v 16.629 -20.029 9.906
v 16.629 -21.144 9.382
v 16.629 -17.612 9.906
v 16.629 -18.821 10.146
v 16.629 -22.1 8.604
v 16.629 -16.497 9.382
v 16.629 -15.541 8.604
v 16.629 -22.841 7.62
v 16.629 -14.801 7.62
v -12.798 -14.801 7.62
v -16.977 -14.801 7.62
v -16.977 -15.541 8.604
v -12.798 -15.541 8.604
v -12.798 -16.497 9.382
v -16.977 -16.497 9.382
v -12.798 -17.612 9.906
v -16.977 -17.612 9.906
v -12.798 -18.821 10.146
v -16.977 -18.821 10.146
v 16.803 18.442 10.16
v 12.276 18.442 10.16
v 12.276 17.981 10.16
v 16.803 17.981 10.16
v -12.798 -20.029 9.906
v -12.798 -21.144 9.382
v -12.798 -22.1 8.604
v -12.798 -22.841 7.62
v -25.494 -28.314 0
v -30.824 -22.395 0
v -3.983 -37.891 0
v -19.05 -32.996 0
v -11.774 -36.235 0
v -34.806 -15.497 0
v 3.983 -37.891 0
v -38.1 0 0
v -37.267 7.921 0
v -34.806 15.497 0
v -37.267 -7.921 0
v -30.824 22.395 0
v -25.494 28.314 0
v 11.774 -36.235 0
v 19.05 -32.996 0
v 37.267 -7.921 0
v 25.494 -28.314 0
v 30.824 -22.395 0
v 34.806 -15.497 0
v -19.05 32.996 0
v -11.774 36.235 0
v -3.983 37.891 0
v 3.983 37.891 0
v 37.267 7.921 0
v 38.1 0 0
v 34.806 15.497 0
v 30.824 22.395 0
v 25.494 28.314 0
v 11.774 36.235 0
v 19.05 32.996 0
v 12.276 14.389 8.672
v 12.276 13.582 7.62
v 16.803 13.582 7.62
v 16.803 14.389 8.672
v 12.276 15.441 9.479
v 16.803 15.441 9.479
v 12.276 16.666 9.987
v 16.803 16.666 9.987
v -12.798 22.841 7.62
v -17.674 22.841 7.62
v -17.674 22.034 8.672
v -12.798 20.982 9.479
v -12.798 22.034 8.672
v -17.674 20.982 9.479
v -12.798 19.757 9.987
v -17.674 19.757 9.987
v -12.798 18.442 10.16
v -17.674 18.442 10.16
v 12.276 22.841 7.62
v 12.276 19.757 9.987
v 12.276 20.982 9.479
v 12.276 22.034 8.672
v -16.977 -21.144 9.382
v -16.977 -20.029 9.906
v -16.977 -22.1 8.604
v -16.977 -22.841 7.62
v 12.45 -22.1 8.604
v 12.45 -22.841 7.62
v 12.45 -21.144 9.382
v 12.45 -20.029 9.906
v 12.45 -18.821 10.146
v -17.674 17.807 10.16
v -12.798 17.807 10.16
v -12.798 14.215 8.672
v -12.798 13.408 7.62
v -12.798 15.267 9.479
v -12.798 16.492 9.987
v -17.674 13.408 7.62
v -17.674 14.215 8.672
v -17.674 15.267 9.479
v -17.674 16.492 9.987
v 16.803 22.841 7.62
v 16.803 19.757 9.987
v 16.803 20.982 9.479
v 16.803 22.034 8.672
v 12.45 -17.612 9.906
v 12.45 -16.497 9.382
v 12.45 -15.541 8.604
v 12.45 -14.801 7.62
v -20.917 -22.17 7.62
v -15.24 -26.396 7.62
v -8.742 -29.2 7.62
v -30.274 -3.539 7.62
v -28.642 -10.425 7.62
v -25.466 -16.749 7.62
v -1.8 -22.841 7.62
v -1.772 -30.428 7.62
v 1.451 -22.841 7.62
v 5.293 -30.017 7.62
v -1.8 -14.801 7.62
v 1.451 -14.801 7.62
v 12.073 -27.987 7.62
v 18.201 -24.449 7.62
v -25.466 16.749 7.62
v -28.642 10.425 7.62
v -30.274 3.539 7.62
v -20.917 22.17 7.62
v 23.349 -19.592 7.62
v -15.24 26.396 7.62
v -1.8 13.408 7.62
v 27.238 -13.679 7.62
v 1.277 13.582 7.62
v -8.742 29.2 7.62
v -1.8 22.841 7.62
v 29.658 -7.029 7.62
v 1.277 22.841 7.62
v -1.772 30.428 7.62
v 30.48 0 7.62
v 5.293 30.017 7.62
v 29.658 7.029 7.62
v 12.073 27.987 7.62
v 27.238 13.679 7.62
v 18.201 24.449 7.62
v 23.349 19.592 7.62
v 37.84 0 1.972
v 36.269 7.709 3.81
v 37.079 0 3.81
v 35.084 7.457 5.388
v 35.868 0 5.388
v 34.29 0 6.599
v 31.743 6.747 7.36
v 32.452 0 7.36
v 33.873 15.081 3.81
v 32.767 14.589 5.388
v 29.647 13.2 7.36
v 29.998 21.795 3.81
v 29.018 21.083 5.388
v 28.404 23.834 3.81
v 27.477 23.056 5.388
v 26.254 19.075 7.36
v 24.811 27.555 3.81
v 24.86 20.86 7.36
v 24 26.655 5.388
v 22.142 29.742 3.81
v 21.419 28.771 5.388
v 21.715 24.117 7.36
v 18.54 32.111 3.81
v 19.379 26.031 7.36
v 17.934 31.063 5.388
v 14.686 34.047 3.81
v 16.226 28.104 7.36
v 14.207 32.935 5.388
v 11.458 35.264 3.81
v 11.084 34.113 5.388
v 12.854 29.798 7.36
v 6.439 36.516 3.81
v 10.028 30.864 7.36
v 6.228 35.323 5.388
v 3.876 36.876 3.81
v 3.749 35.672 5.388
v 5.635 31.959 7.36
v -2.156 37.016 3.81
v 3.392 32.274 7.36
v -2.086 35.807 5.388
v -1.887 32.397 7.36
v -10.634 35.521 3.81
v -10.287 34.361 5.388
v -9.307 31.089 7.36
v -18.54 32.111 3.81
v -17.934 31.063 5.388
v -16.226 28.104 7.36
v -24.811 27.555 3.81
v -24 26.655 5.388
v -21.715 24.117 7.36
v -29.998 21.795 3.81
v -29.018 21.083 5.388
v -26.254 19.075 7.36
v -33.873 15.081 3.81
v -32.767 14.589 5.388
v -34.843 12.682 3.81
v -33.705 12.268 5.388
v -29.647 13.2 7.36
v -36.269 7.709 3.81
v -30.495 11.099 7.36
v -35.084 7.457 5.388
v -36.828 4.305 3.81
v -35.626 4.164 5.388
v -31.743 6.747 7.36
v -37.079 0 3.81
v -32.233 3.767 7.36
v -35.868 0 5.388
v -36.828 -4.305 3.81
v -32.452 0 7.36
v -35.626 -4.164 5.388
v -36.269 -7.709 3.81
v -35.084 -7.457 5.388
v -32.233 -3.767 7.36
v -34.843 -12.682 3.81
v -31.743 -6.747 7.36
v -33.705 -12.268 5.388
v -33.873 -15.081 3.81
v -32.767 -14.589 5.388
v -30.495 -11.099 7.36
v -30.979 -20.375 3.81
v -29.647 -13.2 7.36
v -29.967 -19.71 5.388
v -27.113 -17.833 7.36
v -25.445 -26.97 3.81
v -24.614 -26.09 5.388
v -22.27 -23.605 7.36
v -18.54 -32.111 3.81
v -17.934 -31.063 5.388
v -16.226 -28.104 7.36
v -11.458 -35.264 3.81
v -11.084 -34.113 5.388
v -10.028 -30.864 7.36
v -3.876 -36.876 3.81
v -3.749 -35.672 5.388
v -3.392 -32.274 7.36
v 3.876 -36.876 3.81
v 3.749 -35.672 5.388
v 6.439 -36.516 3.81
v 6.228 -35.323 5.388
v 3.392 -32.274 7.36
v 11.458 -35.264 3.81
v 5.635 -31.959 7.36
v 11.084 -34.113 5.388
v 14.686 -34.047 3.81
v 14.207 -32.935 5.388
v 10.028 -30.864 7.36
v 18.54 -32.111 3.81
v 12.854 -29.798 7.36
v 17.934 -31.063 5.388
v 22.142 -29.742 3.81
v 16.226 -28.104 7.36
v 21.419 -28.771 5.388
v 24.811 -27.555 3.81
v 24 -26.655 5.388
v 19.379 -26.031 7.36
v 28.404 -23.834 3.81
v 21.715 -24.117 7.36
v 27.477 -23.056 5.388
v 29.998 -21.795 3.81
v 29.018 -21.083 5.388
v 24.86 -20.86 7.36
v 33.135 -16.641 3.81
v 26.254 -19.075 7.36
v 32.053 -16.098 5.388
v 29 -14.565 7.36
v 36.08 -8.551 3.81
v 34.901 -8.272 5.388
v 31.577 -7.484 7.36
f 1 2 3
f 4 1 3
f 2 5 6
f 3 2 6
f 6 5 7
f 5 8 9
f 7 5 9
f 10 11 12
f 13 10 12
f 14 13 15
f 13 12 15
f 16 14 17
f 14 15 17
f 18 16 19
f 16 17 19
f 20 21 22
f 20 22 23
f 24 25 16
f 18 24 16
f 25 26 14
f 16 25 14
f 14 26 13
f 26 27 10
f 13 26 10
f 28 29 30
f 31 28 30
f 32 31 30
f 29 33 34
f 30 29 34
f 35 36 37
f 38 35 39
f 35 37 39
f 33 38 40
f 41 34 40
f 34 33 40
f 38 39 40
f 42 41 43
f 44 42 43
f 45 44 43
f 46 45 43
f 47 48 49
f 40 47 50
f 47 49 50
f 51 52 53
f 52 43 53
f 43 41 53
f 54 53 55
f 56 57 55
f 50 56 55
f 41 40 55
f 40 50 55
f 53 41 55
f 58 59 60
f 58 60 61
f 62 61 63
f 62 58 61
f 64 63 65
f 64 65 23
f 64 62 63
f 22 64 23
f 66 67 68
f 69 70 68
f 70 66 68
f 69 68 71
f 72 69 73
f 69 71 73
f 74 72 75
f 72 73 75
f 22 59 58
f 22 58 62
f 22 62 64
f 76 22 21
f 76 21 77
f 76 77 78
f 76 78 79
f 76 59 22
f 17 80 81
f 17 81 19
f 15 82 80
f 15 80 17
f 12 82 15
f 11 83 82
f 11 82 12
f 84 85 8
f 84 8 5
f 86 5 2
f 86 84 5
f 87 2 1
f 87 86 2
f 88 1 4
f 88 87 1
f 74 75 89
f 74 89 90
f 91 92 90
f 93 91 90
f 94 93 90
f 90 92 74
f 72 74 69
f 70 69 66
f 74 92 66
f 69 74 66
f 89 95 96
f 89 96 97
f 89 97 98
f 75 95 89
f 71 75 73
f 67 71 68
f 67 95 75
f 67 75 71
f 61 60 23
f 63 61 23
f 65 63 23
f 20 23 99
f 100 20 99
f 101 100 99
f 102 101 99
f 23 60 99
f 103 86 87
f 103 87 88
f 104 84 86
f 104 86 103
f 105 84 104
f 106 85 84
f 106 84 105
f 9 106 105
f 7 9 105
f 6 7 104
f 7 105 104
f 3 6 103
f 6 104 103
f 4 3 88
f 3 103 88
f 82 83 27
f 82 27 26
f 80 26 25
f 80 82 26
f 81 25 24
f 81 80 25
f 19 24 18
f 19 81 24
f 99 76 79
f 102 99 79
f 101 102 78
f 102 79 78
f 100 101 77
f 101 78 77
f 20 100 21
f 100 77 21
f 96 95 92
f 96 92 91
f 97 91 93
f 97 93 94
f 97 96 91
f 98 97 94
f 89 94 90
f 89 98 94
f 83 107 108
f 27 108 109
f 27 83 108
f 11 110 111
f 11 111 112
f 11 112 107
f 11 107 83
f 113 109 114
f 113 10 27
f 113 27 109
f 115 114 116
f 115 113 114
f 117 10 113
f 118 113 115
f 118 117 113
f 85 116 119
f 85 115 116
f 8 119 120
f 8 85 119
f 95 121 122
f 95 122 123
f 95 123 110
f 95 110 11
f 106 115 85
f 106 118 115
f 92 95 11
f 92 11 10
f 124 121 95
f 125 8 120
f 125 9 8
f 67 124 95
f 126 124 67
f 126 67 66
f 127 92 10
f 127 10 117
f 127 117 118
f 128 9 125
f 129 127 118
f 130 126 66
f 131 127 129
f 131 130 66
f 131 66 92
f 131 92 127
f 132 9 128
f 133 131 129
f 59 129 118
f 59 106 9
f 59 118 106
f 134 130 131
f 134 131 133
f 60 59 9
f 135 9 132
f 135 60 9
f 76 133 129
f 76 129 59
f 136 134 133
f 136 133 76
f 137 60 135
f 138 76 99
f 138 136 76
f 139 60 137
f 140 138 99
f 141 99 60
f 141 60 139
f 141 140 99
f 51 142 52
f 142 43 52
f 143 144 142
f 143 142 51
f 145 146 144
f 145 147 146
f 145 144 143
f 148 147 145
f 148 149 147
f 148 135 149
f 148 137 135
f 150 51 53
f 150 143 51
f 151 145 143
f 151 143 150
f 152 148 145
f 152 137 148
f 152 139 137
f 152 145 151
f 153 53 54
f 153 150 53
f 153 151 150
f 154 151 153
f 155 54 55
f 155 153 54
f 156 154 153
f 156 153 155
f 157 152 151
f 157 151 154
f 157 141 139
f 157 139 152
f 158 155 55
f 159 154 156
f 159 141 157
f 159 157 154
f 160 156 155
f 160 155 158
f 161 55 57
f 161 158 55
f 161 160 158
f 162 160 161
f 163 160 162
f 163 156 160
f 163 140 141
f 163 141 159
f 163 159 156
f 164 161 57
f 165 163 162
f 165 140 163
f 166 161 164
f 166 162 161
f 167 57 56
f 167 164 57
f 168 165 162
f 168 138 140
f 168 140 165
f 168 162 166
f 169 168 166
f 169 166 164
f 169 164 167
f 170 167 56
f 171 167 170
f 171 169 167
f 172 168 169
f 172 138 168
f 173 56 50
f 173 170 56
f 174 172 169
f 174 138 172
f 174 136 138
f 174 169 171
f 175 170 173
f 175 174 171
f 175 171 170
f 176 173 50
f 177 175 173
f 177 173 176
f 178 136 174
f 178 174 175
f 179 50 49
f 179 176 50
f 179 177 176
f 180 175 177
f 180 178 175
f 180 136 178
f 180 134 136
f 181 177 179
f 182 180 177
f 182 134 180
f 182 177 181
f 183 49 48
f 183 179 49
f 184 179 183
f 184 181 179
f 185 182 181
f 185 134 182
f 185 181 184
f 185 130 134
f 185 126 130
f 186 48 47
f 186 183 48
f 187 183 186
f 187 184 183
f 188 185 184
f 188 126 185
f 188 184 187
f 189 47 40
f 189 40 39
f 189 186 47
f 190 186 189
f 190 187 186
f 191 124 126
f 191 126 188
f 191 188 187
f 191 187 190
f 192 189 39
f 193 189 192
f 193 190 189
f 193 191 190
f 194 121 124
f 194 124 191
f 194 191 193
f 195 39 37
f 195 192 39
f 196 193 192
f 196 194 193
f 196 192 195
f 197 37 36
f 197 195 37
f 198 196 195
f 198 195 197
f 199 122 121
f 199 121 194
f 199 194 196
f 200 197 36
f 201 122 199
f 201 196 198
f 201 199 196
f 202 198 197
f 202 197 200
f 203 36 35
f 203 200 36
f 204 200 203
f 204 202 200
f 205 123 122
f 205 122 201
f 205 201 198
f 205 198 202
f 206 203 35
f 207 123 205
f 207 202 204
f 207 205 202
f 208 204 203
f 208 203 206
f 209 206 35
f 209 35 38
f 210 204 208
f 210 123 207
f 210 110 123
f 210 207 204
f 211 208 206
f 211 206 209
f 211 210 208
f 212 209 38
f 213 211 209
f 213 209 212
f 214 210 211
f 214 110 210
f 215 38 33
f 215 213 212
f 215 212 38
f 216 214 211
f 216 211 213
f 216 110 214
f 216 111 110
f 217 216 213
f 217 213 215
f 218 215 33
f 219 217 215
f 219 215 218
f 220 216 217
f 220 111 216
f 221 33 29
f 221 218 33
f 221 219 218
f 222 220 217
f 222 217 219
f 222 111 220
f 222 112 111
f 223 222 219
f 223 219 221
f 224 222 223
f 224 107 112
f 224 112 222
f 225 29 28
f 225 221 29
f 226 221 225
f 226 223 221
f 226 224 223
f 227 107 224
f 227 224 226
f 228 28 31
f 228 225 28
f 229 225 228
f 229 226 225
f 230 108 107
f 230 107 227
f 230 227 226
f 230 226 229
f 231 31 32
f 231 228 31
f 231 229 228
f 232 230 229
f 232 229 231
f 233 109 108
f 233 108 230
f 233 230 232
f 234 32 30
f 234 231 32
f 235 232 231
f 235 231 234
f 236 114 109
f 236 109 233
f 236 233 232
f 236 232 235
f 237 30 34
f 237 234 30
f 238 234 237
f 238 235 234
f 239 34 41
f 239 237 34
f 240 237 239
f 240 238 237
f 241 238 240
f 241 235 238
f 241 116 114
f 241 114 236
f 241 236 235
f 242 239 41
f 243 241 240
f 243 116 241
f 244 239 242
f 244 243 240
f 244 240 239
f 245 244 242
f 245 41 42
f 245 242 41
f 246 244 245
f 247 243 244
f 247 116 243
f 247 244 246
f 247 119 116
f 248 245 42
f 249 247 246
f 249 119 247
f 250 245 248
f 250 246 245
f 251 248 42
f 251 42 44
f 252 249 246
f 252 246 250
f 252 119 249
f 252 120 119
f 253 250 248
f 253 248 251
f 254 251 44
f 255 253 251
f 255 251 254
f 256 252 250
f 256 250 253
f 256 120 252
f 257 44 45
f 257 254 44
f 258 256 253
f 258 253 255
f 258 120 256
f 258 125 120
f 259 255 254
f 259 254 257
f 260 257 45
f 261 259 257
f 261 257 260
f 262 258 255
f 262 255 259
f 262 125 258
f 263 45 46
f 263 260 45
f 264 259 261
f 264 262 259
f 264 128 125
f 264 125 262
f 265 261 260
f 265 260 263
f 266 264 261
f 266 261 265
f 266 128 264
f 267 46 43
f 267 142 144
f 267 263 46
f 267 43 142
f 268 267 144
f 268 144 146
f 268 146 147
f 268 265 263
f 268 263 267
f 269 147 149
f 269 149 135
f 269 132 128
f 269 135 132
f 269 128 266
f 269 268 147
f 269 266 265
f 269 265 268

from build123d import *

# Parameters (mm, degrees)
F0_R        = 38.1
F0_W        = 4.1789766401
F0_H        = 8.0406331347
F0_W_2      = 4.8754736781
F0_H_2      = 9.433625348
F0_W_3      = 4.5272270218
F0_H_3      = 9.2595015542
F1_DEPTH    = 7.62
F2_R        = 7.61999
F3_DEPTH    = 10.16
F4_T1_DEPTH = 26.1760218962
F4_T3_DEPTH = 26.1760218962
F4_T5_DEPTH = 26.5242722779
F4_T7_DEPTH = 26.8725189342


# Not quite as in the source:
# - a fillet or chamfer that OpenCascade refuses, or shapes differently, is made with other operations: its cross-section is extruded or revolved along the edge and cut away or added
# - a fillet or chamfer is up to 0.001 mm smaller than in the source, because OpenCascade refuses the exact size


with BuildPart() as f1:
    # F0 (on Top) → F1 (new body)
    with BuildSketch(Plane.XY):
        Circle(F0_R)
        with Locations((-14.8876057938, -18.8208604642)):
            Rectangle(F0_W, F0_H, mode=Mode.SUBTRACT)
        with Locations((14.5393563434, -18.8208604642)):
            Rectangle(F0_W, F0_H, mode=Mode.SUBTRACT)
        with Locations((-15.2358543128, 18.1243643575)):
            Rectangle(F0_W_2, F0_H_2, mode=Mode.SUBTRACT)
        with Locations((14.5393586718, 18.2114262544)):
            Rectangle(F0_W_3, F0_H_3, mode=Mode.SUBTRACT)
    extrude(amount=F1_DEPTH)

    # F2 (radius 7.62 in the source; OpenCascade refuses exactly that, so slightly less here)
    f2_edges = [f1.edges().sort_by_distance(p)[0] for p in [
        (-38.1, 0, 7.62),
    ]]
    fillet(f2_edges, radius=F2_R)

    # F0 (on Top) → F3 (join)
    with BuildSketch(Plane.XY):
        with Locations((-15.2358543128, 18.1243643575)):
            Rectangle(F0_W_2, F0_H_2)
        with Locations((14.5393586718, 18.2114262544)):
            Rectangle(F0_W_3, F0_H_3)
        with Locations((14.5393563434, -18.8208604642)):
            Rectangle(F0_W, F0_H)
        with Locations((-14.8876057938, -18.8208604642)):
            Rectangle(F0_W, F0_H)
    extrude(amount=F3_DEPTH)

    # F4: fillet of radius 5.08 on 8 edges, made by hand

    # F4_s2 → F4_t1 (cut)
    with BuildSketch(Plane.YZ.offset(-27.9756167419)):
        with BuildLine():
            ThreePointArc((-22.8411770315, 7.62), (-20.9817679803, 9.4794090512), (-18.4417679803, 10.16))
            Line((-18.4417679803, 10.16), (-22.8411770315, 10.16))
            Line((-22.8411770315, 10.16), (-22.8411770315, 7.62))
        make_face()
        with BuildLine():
            ThreePointArc((-14.8005438969, 7.62), (-16.6599529481, 9.4794090512), (-19.1999529481, 10.16))
            Line((-19.1999529481, 10.16), (-14.8005438969, 10.16))
            Line((-14.8005438969, 10.16), (-14.8005438969, 7.62))
        make_face()
    extrude(amount=F4_T1_DEPTH, mode=Mode.SUBTRACT)

    # F4_s4 → F4_t3 (cut)
    with BuildSketch(Plane.YZ.offset(1.4513453953)):
        with BuildLine():
            ThreePointArc((-22.8411770315, 7.62), (-20.9817679803, 9.4794090512), (-18.4417679803, 10.16))
            Line((-18.4417679803, 10.16), (-22.8411770315, 10.16))
            Line((-22.8411770315, 10.16), (-22.8411770315, 7.62))
        make_face()
        with BuildLine():
            ThreePointArc((-14.8005438969, 7.62), (-16.6599529481, 9.4794090512), (-19.1999529481, 10.16))
            Line((-19.1999529481, 10.16), (-14.8005438969, 10.16))
            Line((-14.8005438969, 10.16), (-14.8005438969, 7.62))
        make_face()
    extrude(amount=F4_T3_DEPTH, mode=Mode.SUBTRACT)

    # F4_s6 → F4_t5 (cut)
    with BuildSketch(Plane.YZ.offset(1.2772225328)):
        with BuildLine():
            ThreePointArc((13.5816754773, 7.62), (15.4410845286, 9.4794090512), (17.9810845286, 10.16))
            Line((17.9810845286, 10.16), (13.5816754773, 10.16))
            Line((13.5816754773, 10.16), (13.5816754773, 7.62))
        make_face()
        with BuildLine():
            ThreePointArc((22.8411770315, 7.62), (20.9817679803, 9.4794090512), (18.4417679803, 10.16))
            Line((18.4417679803, 10.16), (22.8411770315, 10.16))
            Line((22.8411770315, 10.16), (22.8411770315, 7.62))
        make_face()
    extrude(amount=F4_T5_DEPTH, mode=Mode.SUBTRACT)

    # F4_s8 → F4_t7 (cut)
    with BuildSketch(Plane.YZ.offset(-28.6721137799)):
        with BuildLine():
            ThreePointArc((13.4075516835, 7.62), (15.2669607347, 9.4794090512), (17.8069607347, 10.16))
            Line((17.8069607347, 10.16), (13.4075516835, 10.16))
            Line((13.4075516835, 10.16), (13.4075516835, 7.62))
        make_face()
        with BuildLine():
            ThreePointArc((22.8411770315, 7.62), (20.9817679803, 9.4794090512), (18.4417679803, 10.16))
            Line((18.4417679803, 10.16), (22.8411770315, 10.16))
            Line((22.8411770315, 10.16), (22.8411770315, 7.62))
        make_face()
    extrude(amount=F4_T7_DEPTH, mode=Mode.SUBTRACT)


solid = f1.part
